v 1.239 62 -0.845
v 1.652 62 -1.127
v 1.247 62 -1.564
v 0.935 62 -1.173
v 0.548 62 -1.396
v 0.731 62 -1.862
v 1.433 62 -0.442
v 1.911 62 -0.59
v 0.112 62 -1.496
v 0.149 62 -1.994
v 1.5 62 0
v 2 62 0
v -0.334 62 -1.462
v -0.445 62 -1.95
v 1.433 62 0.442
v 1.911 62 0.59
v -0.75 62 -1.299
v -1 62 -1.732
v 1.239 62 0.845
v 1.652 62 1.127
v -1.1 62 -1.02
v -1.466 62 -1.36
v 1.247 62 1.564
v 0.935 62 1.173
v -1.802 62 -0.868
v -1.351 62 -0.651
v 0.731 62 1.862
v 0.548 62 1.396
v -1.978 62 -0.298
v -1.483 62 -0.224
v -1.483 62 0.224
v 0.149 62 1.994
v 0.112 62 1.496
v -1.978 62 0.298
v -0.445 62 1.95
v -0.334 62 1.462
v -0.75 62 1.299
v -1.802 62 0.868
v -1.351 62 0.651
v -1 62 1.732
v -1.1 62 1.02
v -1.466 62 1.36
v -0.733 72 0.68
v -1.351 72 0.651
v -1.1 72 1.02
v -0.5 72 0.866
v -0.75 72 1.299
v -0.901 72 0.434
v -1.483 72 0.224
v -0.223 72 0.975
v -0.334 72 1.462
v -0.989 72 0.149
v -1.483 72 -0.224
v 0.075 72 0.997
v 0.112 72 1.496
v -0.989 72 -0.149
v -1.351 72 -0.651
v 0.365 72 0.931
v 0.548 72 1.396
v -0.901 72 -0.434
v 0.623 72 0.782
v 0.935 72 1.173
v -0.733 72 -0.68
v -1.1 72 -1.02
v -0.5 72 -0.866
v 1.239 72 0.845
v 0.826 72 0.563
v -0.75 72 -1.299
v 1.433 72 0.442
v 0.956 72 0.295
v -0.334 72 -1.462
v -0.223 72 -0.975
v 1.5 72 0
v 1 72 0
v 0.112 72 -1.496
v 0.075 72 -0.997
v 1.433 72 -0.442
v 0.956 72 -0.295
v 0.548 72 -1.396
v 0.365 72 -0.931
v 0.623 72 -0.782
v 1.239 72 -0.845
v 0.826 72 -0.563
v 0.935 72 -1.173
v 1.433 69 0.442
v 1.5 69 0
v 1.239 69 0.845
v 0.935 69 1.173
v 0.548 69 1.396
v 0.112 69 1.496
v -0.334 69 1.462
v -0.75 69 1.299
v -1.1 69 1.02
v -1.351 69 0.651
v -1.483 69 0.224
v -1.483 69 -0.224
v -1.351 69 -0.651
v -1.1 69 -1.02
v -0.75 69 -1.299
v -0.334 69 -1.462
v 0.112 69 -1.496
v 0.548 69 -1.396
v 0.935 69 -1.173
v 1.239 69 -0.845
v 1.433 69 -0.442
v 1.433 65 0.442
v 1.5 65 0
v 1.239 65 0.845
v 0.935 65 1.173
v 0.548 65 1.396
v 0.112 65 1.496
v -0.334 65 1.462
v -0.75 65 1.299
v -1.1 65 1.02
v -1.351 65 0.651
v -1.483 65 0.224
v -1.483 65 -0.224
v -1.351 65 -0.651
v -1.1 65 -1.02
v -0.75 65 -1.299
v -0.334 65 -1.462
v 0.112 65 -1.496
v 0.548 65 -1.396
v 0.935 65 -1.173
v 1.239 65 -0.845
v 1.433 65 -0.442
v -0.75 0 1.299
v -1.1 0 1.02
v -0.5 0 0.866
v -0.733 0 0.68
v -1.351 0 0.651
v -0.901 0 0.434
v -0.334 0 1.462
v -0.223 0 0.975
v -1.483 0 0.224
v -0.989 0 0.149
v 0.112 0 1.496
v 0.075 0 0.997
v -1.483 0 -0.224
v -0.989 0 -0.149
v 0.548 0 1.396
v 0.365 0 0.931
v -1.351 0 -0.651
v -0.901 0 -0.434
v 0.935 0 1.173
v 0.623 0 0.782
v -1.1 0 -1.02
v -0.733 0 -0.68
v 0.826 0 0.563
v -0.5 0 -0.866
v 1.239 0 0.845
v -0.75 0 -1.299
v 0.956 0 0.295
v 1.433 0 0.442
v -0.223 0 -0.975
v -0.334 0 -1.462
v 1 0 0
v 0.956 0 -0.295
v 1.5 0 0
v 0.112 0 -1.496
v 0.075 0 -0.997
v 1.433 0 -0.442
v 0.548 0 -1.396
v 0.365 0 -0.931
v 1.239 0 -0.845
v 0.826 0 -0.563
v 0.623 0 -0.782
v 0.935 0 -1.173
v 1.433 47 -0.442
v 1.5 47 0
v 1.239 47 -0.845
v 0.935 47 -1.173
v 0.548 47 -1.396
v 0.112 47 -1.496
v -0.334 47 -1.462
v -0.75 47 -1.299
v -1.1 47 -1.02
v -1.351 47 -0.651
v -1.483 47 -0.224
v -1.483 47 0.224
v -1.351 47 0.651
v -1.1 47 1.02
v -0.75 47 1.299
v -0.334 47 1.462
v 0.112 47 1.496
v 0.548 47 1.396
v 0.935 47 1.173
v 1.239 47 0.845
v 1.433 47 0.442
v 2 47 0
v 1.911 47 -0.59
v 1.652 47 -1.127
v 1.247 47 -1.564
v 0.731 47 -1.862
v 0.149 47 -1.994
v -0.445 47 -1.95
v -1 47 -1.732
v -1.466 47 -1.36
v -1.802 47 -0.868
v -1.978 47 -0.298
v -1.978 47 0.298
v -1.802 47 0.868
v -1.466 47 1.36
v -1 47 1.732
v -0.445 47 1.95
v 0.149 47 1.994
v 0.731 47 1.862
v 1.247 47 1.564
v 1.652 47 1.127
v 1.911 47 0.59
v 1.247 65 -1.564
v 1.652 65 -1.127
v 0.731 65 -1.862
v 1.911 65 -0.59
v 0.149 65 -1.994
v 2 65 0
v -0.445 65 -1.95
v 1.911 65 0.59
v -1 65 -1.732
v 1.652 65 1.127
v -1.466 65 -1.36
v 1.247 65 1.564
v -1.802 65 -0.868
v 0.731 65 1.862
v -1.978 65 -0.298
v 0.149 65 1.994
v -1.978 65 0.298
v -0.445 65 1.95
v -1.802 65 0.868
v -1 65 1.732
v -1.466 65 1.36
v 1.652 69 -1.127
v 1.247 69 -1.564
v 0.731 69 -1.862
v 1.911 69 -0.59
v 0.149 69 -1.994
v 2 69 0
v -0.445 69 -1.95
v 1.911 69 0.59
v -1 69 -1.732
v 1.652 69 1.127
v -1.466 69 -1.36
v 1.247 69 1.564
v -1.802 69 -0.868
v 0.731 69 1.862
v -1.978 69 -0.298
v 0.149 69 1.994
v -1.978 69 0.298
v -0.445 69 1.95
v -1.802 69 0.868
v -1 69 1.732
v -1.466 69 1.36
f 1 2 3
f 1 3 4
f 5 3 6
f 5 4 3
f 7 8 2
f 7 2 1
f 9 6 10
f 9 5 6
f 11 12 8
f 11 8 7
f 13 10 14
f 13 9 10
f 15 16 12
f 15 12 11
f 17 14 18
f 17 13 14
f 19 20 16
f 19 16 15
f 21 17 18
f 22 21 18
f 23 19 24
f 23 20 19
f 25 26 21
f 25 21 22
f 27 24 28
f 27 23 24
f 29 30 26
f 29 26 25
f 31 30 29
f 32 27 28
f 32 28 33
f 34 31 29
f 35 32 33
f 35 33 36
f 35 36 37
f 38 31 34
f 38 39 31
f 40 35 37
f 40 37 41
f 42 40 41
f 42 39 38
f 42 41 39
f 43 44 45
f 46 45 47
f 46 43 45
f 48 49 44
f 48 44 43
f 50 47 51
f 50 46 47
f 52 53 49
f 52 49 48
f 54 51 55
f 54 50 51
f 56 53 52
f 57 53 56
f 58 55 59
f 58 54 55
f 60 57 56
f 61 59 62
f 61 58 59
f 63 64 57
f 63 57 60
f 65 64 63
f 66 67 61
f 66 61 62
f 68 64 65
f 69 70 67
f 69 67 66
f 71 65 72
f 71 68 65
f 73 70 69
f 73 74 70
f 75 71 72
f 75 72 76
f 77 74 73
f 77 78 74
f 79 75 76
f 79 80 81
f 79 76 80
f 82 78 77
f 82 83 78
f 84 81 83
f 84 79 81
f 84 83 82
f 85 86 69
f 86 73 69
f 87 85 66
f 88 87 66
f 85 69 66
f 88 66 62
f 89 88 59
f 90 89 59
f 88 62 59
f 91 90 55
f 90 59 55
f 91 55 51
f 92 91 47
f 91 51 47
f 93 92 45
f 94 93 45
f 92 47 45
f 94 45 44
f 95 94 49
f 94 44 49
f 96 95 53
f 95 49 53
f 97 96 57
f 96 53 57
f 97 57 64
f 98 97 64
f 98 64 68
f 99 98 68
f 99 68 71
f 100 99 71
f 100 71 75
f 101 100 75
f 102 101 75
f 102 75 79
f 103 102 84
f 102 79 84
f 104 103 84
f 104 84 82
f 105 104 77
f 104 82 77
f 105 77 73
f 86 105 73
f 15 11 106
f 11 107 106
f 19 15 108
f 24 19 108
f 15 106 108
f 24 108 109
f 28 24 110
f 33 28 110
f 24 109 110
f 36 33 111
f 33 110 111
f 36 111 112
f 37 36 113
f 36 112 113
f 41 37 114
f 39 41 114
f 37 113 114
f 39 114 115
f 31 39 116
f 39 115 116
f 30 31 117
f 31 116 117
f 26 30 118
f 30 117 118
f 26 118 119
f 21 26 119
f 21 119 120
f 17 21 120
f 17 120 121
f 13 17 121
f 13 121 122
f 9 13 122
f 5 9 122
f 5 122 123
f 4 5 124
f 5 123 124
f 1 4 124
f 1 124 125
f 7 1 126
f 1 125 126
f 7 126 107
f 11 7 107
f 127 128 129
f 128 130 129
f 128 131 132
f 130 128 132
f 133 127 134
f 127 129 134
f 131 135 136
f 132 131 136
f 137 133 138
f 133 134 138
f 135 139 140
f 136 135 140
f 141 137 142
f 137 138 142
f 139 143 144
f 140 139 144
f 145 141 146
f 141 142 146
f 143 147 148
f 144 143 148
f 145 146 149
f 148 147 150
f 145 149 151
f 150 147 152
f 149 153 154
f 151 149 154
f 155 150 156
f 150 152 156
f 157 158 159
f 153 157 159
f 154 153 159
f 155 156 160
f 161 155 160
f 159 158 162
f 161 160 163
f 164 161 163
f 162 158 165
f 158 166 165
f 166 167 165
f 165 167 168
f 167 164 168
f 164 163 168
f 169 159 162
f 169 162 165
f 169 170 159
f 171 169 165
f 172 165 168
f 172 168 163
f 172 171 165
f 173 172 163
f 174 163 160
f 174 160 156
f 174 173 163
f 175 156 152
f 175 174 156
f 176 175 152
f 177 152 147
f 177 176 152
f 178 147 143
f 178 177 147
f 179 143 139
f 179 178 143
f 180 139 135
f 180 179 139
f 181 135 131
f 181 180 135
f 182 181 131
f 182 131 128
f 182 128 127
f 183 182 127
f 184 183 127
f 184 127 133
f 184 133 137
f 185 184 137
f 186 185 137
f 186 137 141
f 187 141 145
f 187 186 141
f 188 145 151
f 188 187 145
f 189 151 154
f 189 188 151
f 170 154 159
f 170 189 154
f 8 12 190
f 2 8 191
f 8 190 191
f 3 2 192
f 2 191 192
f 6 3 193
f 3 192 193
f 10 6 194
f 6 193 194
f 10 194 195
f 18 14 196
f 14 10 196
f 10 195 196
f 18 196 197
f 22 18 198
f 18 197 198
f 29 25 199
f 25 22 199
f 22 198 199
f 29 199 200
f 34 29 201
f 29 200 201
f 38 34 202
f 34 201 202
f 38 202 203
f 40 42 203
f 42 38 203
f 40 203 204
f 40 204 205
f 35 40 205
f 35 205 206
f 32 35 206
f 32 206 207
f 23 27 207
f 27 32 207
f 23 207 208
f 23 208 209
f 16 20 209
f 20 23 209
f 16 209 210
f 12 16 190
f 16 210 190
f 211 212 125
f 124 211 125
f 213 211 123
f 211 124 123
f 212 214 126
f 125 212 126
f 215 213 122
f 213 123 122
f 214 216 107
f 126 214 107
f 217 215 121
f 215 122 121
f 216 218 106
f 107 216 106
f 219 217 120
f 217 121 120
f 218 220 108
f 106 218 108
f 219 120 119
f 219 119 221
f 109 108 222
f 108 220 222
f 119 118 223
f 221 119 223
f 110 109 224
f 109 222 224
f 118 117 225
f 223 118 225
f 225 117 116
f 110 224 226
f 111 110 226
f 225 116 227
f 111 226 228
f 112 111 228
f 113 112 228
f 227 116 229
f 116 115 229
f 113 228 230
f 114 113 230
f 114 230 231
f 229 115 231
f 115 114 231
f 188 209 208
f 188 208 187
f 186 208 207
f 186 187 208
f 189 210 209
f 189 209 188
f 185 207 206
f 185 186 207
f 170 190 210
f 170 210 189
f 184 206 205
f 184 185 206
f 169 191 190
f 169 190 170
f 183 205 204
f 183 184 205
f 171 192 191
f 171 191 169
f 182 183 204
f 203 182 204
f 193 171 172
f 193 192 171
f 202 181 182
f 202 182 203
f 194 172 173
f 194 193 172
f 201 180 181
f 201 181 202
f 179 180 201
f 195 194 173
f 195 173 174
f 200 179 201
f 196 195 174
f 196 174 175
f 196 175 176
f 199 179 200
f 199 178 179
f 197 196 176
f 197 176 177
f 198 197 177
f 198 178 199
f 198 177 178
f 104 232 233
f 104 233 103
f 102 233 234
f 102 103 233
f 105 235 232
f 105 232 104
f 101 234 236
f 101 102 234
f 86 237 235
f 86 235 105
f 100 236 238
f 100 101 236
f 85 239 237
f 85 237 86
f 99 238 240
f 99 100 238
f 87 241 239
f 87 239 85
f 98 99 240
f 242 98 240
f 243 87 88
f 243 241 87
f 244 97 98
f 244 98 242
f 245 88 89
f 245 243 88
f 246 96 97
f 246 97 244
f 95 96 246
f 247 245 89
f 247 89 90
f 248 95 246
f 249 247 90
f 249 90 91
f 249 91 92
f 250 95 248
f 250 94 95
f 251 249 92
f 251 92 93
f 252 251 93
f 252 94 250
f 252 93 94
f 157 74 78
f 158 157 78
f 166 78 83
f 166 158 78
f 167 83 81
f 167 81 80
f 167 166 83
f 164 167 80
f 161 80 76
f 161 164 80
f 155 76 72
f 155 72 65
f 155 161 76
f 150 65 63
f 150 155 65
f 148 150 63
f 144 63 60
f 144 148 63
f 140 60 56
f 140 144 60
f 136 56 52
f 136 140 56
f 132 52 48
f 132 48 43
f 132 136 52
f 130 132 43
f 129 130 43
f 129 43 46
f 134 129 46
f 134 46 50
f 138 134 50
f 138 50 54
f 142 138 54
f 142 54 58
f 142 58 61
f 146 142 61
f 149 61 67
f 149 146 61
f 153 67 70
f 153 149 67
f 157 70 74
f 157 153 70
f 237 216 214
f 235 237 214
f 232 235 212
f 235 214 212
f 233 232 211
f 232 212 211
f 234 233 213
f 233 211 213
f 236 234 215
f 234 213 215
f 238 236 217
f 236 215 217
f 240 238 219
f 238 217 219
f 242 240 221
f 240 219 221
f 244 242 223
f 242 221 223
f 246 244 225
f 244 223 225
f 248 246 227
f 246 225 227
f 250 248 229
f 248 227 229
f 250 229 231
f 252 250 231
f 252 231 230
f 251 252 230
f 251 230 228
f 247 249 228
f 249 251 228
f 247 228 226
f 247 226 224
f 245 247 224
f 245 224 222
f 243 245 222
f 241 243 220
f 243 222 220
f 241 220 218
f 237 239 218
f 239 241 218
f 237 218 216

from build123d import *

# Parameters (mm, degrees)
SKETCH_1_R      = 2
SKETCH_1_R_2    = 1
EXTRUDE_1_DEPTH = 72
SKETCH_2_W      = 0.5
SKETCH_2_H      = 3
SKETCH_3_W      = 0.5
SKETCH_3_H      = 47


with BuildPart() as part:
    # Эскиз1 → Бобышка-Вытянуть1 (new body)
    with BuildSketch(Plane(origin=(0, 0, 0), x_dir=(1, 0, 0), z_dir=(0, 1, 0))):
        Circle(SKETCH_1_R)
        Circle(SKETCH_1_R_2, mode=Mode.SUBTRACT)
    extrude(amount=EXTRUDE_1_DEPTH)

    # Эскиз2 → Вырез-Повернуть1 (revolve, cut)
    with BuildSketch(Plane.XY):
        with Locations((1.75, 70.5)):
            Rectangle(SKETCH_2_W, SKETCH_2_H)
        with Locations((1.75, 63.5)):
            Rectangle(SKETCH_2_W, SKETCH_2_H)
    revolve(axis=Axis((0, 72, 0), (0, -1, 0)), mode=Mode.SUBTRACT)

    # Эскиз3 → Вырез-Повернуть2 (revolve, cut)
    with BuildSketch(Plane.XY):
        with Locations((1.75, 23.5)):
            Rectangle(SKETCH_3_W, SKETCH_3_H)
    revolve(axis=Axis((0, 0, 0), (0, 1, 0)), mode=Mode.SUBTRACT)


solid = part.part
